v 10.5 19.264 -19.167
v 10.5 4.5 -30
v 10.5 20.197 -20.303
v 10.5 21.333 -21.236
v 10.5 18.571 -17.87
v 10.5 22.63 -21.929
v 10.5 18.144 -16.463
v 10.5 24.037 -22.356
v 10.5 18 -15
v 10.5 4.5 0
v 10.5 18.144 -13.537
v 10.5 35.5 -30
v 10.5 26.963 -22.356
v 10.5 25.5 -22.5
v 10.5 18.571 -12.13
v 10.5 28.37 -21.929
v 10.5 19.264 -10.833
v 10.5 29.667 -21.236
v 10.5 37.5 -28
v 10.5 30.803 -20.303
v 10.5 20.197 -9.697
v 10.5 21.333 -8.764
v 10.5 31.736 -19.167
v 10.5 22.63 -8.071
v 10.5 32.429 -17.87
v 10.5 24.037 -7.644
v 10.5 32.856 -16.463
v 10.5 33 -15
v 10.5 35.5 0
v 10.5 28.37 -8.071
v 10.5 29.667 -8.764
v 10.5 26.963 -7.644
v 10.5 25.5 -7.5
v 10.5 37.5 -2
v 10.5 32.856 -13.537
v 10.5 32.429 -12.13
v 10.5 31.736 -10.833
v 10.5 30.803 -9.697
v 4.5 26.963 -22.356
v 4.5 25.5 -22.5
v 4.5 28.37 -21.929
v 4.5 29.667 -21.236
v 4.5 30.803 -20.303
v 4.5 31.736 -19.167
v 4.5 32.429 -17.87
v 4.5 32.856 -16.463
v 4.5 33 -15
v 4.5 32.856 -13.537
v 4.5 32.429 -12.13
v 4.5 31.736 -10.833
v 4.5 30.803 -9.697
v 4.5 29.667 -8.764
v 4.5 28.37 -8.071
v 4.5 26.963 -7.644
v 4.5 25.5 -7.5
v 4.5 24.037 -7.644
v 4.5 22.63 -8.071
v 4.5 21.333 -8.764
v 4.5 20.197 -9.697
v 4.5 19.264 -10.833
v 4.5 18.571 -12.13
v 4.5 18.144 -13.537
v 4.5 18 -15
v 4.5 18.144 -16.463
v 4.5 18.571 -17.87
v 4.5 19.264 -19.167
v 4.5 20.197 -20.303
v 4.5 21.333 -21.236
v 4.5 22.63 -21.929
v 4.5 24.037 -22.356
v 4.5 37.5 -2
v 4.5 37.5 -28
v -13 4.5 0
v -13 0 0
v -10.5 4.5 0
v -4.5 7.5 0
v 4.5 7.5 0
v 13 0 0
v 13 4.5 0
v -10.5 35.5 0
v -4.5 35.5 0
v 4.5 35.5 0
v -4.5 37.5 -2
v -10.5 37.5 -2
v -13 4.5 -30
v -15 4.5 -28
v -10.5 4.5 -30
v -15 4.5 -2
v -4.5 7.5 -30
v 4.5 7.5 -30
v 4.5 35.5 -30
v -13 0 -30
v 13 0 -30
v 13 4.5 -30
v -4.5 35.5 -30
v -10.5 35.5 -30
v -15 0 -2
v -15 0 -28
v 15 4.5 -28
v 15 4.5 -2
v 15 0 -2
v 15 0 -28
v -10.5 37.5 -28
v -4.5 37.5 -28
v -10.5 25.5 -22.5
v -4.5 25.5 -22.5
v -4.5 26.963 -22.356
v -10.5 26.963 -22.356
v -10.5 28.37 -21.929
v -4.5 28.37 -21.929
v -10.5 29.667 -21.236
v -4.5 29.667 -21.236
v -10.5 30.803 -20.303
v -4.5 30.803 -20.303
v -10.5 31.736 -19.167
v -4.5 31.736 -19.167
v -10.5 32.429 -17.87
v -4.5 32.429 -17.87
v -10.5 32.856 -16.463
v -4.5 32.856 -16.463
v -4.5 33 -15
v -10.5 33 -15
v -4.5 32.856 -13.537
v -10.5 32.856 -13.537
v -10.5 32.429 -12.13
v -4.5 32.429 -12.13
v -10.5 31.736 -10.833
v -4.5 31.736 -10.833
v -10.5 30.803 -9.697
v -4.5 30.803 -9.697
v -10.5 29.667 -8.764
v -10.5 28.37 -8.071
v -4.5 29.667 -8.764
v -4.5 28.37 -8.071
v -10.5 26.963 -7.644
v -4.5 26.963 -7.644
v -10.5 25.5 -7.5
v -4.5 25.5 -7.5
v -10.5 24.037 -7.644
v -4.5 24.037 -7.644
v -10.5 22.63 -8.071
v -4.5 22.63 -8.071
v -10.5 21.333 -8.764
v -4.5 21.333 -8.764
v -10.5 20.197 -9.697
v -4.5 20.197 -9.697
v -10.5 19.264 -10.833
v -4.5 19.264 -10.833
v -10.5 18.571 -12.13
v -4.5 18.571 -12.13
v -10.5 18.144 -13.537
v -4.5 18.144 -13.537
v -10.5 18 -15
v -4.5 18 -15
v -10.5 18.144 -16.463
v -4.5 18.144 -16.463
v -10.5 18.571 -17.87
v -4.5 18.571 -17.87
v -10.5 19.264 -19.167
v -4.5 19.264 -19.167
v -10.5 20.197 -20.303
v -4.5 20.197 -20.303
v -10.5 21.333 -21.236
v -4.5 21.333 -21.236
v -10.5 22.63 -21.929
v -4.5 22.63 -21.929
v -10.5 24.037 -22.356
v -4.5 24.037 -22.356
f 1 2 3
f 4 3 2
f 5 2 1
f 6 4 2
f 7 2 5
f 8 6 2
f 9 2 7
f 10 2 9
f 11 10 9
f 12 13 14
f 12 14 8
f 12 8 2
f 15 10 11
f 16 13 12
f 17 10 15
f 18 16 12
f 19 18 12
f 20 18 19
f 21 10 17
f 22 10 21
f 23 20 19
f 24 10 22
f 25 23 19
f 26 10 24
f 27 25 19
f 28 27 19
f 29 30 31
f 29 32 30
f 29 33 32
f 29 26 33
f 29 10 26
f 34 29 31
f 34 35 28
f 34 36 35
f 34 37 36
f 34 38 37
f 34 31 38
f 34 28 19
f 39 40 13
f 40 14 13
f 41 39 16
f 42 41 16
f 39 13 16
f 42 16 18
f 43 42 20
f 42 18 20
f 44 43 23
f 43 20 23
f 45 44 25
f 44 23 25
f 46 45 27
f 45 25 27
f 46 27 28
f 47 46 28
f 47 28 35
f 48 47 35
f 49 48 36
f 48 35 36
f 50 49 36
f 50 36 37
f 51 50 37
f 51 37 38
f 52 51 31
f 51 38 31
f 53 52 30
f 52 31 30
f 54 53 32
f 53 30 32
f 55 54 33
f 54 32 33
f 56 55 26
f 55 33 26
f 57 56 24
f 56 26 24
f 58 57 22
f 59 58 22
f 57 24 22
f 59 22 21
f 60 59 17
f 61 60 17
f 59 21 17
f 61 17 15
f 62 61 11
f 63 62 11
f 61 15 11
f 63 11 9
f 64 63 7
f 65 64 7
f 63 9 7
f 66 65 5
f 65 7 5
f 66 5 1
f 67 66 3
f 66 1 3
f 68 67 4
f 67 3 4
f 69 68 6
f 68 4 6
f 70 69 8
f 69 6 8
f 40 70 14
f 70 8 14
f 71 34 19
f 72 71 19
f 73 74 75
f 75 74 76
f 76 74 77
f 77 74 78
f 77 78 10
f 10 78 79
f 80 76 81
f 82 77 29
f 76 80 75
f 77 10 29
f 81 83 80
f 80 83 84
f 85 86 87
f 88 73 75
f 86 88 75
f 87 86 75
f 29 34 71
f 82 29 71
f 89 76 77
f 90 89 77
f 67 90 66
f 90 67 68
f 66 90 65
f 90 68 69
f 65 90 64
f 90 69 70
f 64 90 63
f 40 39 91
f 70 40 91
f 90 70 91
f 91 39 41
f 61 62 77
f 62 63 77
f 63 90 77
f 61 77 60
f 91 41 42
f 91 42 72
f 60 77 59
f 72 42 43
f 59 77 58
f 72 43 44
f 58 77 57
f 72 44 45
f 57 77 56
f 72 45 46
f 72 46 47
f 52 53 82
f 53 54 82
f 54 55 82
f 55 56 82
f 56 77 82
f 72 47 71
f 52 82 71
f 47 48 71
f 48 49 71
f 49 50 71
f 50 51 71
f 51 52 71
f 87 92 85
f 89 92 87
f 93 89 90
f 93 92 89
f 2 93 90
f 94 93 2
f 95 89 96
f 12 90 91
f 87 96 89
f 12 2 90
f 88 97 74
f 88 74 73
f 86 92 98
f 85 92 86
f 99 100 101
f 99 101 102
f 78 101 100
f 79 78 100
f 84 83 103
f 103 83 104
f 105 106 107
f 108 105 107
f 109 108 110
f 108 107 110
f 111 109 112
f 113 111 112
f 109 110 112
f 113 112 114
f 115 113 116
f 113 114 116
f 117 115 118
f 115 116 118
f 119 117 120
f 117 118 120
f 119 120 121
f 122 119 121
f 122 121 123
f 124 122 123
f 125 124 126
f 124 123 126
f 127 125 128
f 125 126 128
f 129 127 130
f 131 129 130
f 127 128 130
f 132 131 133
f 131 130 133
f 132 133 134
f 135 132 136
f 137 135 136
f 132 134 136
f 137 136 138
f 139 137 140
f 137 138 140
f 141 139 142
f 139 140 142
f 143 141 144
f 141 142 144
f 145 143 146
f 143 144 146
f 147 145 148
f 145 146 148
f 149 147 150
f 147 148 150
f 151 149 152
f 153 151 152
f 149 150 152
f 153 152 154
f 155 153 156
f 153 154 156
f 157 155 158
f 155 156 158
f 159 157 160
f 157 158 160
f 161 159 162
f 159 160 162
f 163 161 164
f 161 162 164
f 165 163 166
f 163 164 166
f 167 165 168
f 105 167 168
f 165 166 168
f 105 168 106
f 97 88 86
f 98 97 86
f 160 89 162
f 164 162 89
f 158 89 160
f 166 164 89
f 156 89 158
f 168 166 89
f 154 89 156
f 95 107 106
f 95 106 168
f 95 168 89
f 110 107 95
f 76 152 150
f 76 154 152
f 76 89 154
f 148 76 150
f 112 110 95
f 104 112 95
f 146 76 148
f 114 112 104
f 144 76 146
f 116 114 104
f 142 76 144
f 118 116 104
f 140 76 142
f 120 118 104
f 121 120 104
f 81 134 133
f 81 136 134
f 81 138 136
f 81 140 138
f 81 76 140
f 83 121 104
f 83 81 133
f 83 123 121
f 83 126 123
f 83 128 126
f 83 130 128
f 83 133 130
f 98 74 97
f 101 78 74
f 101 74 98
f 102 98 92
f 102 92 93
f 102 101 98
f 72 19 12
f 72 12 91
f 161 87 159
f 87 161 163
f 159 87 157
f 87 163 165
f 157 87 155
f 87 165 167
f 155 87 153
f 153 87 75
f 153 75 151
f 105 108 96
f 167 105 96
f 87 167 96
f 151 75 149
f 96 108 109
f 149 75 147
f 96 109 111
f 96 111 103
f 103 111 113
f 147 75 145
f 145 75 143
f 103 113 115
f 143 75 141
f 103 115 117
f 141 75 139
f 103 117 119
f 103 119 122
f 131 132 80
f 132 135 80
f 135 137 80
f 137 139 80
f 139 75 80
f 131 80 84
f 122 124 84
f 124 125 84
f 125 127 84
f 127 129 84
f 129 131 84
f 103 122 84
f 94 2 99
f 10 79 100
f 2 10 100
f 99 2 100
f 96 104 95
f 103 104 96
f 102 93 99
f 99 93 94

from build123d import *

# Parameters (mm, degrees)
SKETCH_1_W          = 30
SKETCH_1_H          = 37.5
EXTRUDE_1_DEPTH     = 15
CHAMFER_1_SIZE      = 2
CUT_EXTRUDE_1_REACH = 32
SKETCH_2_W          = 4.5
SKETCH_2_H          = 33
SKETCH_2_W_2        = 9
SKETCH_2_H_2        = 30
SKETCH_3_R          = 7.5
CUT_EXTRUDE_2_DEPTH = 10.5
CHAMFER_2_SIZE      = 2


with BuildPart() as part:
    # 스케치1 → 보스-돌출1 (new body, symmetric)
    with BuildSketch(Plane(origin=(0, 0, 0), x_dir=(0, 0, -1), z_dir=(1, 0, 0))):
        with Locations((15, 18.75)):
            Rectangle(SKETCH_1_W, SKETCH_1_H)
    extrude(amount=EXTRUDE_1_DEPTH, both=True)

    # 모따기1
    chamfer_1_edges = [part.edges().sort_by_distance(p)[0] for p in [
        (0, 37.5, 0),
        (0, 37.5, -30),
    ]]
    chamfer(chamfer_1_edges, length=CHAMFER_1_SIZE)

    # 스케치2 → 컷-돌출1 (cut, up to next)
    with BuildSketch(Plane.XY, mode=Mode.PRIVATE) as cut_extrude_1_sk1:
        with Locations((-12.75, 21)):
            Rectangle(SKETCH_2_W, SKETCH_2_H)
    cut_extrude_1_tool1 = extrude(cut_extrude_1_sk1.sketch, amount=-CUT_EXTRUDE_1_REACH, mode=Mode.PRIVATE) & part.part
    add(cut_extrude_1_tool1.solids().sort_by_distance((-12.75, 21, 0))[0], mode=Mode.SUBTRACT)
    # 스케치2 → 컷-돌출1 (cut, up to next)
    with BuildSketch(Plane.XY, mode=Mode.PRIVATE) as cut_extrude_1_sk2:
        with Locations((12.75, 21)):
            Rectangle(SKETCH_2_W, SKETCH_2_H)
    cut_extrude_1_tool2 = extrude(cut_extrude_1_sk2.sketch, amount=-CUT_EXTRUDE_1_REACH, mode=Mode.PRIVATE) & part.part
    add(cut_extrude_1_tool2.solids().sort_by_distance((12.75, 21, 0))[0], mode=Mode.SUBTRACT)
    # 스케치2 → 컷-돌출1 (cut, up to next)
    with BuildSketch(Plane.XY, mode=Mode.PRIVATE) as cut_extrude_1_sk3:
        with Locations((0, 22.5)):
            Rectangle(SKETCH_2_W_2, SKETCH_2_H_2)
    cut_extrude_1_tool3 = extrude(cut_extrude_1_sk3.sketch, amount=-CUT_EXTRUDE_1_REACH, mode=Mode.PRIVATE) & part.part
    add(cut_extrude_1_tool3.solids().sort_by_distance((0, 22.5, 0))[0], mode=Mode.SUBTRACT)

    # 스케치3 → 컷-돌출2 (cut, symmetric)
    with BuildSketch(Plane(origin=(0, 0, 0), x_dir=(0, 0, -1), z_dir=(1, 0, 0))):
        with Locations((15, 25.5)):
            Circle(SKETCH_3_R)
    extrude(amount=CUT_EXTRUDE_2_DEPTH, both=True, mode=Mode.SUBTRACT)

    # 모따기2
    chamfer_2_edges = [part.edges().sort_by_distance(p)[0] for p in [
        (15, 2.25, -30),
        (-15, 2.25, 0),
        (15, 2.25, 0),
        (-15, 2.25, -30),
    ]]
    chamfer(chamfer_2_edges, length=CHAMFER_2_SIZE)


solid = part.part
